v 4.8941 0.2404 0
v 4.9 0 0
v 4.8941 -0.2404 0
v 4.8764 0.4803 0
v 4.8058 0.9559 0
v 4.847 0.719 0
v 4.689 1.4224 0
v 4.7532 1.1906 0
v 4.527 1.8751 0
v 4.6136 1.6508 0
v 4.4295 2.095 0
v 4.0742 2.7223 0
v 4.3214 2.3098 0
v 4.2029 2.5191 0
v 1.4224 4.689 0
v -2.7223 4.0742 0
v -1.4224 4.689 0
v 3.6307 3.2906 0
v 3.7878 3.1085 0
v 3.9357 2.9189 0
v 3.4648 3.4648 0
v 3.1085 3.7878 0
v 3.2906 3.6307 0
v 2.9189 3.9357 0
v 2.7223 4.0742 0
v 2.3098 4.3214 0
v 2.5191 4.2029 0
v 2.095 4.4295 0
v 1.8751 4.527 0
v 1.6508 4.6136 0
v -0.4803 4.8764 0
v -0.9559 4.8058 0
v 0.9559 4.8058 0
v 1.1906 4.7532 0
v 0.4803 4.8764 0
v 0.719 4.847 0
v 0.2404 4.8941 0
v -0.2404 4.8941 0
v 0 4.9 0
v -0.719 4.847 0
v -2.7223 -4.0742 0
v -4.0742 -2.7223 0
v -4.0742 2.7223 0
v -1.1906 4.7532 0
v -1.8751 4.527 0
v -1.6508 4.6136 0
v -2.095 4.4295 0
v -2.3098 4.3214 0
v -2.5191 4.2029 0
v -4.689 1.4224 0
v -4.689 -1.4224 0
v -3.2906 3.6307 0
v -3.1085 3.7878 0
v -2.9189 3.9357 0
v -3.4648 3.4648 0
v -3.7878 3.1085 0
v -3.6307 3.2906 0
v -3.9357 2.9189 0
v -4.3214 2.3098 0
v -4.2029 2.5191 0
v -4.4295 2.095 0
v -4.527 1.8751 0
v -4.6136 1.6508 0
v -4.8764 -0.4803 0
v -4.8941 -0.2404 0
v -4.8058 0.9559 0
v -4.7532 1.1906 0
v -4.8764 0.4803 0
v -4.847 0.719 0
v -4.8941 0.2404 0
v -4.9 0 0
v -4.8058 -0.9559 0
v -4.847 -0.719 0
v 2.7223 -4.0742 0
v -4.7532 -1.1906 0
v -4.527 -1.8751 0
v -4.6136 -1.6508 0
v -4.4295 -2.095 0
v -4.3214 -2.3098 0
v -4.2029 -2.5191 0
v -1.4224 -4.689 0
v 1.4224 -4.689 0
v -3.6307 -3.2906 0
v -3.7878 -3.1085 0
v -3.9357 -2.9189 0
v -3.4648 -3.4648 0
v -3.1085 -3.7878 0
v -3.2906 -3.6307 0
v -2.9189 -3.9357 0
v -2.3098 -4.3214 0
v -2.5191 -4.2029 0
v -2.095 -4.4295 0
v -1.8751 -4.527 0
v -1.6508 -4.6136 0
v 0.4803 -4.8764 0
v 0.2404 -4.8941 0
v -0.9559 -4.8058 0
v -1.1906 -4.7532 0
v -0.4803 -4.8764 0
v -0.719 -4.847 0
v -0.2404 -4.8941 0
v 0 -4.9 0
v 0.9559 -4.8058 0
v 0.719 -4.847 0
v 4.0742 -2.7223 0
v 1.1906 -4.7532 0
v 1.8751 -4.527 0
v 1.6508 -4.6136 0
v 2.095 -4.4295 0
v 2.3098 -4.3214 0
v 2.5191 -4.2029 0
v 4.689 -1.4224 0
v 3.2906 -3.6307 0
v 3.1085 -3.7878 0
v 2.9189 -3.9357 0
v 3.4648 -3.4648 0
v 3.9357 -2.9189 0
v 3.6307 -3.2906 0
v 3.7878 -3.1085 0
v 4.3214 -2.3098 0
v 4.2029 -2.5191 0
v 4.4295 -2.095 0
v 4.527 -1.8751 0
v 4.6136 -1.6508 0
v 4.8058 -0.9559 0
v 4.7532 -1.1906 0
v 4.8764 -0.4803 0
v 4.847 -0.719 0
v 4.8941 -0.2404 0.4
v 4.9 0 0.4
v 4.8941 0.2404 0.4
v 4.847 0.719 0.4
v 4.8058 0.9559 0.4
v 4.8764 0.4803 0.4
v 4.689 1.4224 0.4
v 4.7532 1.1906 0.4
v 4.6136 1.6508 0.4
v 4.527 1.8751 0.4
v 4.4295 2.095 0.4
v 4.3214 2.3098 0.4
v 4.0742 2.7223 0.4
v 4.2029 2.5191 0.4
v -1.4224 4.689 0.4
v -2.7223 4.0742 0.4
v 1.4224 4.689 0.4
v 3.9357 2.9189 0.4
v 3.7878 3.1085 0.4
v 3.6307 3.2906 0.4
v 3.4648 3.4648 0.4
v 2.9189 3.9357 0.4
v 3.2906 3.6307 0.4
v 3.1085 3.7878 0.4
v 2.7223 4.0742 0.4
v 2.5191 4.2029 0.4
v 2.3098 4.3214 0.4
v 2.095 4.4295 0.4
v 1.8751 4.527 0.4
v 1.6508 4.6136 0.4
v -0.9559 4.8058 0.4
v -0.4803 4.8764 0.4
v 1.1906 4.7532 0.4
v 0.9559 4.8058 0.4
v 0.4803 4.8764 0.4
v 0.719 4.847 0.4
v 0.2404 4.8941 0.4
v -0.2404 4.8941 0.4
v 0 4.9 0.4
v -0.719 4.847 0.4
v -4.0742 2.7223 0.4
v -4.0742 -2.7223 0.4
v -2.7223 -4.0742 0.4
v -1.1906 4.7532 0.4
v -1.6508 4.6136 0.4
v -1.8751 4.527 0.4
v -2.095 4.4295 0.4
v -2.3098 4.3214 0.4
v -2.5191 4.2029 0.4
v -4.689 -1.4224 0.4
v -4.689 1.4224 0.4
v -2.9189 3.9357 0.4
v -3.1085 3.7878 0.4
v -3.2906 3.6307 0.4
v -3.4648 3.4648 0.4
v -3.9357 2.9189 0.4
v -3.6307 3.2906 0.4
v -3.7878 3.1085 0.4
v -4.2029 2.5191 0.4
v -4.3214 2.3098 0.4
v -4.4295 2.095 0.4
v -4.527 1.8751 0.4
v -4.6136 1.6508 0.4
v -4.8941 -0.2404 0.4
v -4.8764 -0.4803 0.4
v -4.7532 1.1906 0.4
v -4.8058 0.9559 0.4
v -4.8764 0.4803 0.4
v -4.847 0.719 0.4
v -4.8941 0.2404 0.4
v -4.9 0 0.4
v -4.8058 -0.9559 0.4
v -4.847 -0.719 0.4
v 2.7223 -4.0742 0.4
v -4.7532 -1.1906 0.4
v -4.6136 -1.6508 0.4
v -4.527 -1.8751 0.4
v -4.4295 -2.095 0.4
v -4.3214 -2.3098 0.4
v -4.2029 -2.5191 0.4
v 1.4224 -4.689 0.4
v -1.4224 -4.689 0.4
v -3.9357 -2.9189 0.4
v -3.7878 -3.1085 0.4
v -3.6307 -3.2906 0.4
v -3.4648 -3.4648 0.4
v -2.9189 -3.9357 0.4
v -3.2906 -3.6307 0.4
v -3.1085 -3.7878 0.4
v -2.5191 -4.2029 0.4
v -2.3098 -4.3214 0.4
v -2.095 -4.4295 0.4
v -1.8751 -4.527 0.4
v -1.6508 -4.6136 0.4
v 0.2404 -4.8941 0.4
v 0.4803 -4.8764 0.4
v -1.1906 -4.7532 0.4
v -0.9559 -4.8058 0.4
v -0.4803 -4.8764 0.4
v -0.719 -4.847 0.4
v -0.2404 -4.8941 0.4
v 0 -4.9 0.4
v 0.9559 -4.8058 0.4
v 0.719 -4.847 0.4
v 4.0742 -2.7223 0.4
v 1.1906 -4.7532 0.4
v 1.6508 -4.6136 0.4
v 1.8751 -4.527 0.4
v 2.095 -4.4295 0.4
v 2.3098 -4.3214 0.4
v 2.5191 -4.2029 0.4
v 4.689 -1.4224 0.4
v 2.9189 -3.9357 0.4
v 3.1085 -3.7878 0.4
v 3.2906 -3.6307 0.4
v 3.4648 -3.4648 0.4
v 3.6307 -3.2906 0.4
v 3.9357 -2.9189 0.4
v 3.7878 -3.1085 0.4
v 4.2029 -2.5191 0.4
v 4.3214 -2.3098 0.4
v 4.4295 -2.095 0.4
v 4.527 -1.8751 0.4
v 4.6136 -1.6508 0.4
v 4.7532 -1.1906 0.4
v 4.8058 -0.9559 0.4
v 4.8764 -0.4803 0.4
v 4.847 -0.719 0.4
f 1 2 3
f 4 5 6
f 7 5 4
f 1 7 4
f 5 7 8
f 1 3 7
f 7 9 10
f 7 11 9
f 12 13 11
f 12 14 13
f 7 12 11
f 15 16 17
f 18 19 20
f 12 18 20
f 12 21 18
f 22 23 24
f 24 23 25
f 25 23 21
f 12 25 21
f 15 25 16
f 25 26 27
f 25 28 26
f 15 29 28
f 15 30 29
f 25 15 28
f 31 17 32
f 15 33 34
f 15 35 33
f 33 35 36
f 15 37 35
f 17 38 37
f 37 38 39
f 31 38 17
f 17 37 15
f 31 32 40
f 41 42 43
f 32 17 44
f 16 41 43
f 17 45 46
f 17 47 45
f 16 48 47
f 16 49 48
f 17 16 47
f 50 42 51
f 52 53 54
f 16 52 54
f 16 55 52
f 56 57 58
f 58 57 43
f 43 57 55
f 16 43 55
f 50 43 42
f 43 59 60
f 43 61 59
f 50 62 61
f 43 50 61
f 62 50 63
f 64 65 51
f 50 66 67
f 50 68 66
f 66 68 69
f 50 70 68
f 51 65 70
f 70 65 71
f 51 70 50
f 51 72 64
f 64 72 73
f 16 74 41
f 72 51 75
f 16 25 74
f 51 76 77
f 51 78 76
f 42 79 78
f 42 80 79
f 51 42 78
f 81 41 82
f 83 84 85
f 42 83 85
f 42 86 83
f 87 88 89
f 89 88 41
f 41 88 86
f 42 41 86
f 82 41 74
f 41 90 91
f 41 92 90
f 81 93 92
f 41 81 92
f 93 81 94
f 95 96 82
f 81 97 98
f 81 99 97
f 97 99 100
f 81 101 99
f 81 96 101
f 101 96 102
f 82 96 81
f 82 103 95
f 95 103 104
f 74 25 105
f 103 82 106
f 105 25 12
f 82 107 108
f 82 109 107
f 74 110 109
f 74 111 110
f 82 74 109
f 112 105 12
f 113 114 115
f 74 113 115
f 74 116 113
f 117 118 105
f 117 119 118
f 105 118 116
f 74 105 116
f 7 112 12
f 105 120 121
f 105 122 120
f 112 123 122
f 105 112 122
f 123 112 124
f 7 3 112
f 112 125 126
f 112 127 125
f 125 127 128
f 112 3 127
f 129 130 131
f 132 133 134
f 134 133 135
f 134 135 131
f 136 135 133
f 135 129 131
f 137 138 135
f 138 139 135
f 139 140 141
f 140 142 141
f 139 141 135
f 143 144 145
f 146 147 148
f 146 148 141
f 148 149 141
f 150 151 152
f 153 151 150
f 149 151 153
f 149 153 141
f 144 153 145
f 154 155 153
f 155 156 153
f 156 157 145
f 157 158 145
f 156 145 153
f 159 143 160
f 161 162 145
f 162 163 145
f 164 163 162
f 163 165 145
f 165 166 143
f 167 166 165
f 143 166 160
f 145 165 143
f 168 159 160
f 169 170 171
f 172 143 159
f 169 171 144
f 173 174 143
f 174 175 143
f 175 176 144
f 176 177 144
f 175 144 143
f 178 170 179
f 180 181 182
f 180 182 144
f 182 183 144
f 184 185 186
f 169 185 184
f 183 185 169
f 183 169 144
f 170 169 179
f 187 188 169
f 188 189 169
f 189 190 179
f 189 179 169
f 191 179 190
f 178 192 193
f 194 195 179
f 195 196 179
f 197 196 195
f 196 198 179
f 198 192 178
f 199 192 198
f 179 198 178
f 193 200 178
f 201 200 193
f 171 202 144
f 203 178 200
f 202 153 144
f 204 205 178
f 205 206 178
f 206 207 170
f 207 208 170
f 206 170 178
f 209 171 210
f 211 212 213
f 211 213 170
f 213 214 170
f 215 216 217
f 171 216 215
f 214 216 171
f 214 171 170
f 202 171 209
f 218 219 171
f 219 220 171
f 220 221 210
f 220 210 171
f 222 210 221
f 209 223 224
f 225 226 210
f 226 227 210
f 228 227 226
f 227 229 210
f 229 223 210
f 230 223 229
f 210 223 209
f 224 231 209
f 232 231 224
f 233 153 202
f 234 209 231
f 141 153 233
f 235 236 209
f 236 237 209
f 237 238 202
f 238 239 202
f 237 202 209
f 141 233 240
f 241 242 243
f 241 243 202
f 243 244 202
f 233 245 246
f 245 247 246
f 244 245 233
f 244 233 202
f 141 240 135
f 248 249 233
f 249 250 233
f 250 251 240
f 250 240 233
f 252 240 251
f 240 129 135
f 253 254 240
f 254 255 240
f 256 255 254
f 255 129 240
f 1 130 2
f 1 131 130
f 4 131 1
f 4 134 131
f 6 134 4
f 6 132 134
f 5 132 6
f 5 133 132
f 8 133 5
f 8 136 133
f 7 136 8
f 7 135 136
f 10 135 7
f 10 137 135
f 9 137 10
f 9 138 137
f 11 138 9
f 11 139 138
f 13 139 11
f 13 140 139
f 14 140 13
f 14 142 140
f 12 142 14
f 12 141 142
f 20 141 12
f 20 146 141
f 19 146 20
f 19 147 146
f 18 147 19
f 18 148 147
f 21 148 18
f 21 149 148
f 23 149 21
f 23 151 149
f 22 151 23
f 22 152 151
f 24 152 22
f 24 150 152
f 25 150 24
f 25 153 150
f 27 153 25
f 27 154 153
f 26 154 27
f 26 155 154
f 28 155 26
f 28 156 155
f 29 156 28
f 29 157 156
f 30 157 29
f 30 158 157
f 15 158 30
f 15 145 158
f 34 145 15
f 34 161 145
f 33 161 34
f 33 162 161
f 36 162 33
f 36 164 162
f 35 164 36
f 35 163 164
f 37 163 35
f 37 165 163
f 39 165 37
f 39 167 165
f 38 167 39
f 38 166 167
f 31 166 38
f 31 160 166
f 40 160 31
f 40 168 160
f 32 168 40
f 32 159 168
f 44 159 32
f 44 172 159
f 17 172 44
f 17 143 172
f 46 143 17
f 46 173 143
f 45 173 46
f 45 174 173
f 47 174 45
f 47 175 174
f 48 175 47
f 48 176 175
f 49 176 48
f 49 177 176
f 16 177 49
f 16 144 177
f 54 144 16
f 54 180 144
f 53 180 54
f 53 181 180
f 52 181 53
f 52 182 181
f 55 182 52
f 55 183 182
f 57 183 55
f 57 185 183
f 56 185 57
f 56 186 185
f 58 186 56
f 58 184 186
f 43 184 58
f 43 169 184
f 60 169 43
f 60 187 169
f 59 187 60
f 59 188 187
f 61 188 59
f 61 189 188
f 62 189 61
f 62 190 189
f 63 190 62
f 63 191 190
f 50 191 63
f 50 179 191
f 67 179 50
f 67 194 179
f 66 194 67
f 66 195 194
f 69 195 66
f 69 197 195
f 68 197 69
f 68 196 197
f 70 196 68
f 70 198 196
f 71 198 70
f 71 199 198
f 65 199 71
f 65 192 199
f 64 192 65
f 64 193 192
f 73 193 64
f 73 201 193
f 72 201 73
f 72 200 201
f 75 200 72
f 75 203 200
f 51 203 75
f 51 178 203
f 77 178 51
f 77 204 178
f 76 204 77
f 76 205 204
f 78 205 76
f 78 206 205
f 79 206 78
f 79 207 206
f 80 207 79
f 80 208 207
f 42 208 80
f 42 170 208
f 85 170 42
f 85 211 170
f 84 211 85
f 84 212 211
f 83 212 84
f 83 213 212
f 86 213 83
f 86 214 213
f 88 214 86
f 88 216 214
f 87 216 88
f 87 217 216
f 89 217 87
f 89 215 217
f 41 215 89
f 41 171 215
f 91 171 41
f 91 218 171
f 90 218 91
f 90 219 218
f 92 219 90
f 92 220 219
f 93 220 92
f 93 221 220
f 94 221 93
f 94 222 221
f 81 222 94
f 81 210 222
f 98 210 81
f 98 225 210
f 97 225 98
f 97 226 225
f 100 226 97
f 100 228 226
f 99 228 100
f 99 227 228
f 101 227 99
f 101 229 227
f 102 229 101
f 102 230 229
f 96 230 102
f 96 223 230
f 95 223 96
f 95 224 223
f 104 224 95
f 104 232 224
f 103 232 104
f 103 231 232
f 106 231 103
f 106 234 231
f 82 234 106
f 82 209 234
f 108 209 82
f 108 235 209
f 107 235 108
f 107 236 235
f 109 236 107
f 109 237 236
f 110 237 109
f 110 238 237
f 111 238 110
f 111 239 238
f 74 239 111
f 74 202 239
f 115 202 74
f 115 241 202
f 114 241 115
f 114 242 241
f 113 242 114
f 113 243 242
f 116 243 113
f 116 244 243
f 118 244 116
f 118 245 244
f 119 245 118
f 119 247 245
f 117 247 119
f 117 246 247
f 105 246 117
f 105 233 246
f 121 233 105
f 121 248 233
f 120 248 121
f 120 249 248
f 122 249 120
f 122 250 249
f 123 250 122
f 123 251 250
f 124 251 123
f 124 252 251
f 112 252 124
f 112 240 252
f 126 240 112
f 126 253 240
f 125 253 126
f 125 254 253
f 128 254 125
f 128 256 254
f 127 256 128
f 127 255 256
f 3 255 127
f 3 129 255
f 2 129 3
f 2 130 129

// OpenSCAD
// LED Cover Pinhole Wafer

$fn = 128;

linear_extrude(0.4)
circle(d=9.8);
